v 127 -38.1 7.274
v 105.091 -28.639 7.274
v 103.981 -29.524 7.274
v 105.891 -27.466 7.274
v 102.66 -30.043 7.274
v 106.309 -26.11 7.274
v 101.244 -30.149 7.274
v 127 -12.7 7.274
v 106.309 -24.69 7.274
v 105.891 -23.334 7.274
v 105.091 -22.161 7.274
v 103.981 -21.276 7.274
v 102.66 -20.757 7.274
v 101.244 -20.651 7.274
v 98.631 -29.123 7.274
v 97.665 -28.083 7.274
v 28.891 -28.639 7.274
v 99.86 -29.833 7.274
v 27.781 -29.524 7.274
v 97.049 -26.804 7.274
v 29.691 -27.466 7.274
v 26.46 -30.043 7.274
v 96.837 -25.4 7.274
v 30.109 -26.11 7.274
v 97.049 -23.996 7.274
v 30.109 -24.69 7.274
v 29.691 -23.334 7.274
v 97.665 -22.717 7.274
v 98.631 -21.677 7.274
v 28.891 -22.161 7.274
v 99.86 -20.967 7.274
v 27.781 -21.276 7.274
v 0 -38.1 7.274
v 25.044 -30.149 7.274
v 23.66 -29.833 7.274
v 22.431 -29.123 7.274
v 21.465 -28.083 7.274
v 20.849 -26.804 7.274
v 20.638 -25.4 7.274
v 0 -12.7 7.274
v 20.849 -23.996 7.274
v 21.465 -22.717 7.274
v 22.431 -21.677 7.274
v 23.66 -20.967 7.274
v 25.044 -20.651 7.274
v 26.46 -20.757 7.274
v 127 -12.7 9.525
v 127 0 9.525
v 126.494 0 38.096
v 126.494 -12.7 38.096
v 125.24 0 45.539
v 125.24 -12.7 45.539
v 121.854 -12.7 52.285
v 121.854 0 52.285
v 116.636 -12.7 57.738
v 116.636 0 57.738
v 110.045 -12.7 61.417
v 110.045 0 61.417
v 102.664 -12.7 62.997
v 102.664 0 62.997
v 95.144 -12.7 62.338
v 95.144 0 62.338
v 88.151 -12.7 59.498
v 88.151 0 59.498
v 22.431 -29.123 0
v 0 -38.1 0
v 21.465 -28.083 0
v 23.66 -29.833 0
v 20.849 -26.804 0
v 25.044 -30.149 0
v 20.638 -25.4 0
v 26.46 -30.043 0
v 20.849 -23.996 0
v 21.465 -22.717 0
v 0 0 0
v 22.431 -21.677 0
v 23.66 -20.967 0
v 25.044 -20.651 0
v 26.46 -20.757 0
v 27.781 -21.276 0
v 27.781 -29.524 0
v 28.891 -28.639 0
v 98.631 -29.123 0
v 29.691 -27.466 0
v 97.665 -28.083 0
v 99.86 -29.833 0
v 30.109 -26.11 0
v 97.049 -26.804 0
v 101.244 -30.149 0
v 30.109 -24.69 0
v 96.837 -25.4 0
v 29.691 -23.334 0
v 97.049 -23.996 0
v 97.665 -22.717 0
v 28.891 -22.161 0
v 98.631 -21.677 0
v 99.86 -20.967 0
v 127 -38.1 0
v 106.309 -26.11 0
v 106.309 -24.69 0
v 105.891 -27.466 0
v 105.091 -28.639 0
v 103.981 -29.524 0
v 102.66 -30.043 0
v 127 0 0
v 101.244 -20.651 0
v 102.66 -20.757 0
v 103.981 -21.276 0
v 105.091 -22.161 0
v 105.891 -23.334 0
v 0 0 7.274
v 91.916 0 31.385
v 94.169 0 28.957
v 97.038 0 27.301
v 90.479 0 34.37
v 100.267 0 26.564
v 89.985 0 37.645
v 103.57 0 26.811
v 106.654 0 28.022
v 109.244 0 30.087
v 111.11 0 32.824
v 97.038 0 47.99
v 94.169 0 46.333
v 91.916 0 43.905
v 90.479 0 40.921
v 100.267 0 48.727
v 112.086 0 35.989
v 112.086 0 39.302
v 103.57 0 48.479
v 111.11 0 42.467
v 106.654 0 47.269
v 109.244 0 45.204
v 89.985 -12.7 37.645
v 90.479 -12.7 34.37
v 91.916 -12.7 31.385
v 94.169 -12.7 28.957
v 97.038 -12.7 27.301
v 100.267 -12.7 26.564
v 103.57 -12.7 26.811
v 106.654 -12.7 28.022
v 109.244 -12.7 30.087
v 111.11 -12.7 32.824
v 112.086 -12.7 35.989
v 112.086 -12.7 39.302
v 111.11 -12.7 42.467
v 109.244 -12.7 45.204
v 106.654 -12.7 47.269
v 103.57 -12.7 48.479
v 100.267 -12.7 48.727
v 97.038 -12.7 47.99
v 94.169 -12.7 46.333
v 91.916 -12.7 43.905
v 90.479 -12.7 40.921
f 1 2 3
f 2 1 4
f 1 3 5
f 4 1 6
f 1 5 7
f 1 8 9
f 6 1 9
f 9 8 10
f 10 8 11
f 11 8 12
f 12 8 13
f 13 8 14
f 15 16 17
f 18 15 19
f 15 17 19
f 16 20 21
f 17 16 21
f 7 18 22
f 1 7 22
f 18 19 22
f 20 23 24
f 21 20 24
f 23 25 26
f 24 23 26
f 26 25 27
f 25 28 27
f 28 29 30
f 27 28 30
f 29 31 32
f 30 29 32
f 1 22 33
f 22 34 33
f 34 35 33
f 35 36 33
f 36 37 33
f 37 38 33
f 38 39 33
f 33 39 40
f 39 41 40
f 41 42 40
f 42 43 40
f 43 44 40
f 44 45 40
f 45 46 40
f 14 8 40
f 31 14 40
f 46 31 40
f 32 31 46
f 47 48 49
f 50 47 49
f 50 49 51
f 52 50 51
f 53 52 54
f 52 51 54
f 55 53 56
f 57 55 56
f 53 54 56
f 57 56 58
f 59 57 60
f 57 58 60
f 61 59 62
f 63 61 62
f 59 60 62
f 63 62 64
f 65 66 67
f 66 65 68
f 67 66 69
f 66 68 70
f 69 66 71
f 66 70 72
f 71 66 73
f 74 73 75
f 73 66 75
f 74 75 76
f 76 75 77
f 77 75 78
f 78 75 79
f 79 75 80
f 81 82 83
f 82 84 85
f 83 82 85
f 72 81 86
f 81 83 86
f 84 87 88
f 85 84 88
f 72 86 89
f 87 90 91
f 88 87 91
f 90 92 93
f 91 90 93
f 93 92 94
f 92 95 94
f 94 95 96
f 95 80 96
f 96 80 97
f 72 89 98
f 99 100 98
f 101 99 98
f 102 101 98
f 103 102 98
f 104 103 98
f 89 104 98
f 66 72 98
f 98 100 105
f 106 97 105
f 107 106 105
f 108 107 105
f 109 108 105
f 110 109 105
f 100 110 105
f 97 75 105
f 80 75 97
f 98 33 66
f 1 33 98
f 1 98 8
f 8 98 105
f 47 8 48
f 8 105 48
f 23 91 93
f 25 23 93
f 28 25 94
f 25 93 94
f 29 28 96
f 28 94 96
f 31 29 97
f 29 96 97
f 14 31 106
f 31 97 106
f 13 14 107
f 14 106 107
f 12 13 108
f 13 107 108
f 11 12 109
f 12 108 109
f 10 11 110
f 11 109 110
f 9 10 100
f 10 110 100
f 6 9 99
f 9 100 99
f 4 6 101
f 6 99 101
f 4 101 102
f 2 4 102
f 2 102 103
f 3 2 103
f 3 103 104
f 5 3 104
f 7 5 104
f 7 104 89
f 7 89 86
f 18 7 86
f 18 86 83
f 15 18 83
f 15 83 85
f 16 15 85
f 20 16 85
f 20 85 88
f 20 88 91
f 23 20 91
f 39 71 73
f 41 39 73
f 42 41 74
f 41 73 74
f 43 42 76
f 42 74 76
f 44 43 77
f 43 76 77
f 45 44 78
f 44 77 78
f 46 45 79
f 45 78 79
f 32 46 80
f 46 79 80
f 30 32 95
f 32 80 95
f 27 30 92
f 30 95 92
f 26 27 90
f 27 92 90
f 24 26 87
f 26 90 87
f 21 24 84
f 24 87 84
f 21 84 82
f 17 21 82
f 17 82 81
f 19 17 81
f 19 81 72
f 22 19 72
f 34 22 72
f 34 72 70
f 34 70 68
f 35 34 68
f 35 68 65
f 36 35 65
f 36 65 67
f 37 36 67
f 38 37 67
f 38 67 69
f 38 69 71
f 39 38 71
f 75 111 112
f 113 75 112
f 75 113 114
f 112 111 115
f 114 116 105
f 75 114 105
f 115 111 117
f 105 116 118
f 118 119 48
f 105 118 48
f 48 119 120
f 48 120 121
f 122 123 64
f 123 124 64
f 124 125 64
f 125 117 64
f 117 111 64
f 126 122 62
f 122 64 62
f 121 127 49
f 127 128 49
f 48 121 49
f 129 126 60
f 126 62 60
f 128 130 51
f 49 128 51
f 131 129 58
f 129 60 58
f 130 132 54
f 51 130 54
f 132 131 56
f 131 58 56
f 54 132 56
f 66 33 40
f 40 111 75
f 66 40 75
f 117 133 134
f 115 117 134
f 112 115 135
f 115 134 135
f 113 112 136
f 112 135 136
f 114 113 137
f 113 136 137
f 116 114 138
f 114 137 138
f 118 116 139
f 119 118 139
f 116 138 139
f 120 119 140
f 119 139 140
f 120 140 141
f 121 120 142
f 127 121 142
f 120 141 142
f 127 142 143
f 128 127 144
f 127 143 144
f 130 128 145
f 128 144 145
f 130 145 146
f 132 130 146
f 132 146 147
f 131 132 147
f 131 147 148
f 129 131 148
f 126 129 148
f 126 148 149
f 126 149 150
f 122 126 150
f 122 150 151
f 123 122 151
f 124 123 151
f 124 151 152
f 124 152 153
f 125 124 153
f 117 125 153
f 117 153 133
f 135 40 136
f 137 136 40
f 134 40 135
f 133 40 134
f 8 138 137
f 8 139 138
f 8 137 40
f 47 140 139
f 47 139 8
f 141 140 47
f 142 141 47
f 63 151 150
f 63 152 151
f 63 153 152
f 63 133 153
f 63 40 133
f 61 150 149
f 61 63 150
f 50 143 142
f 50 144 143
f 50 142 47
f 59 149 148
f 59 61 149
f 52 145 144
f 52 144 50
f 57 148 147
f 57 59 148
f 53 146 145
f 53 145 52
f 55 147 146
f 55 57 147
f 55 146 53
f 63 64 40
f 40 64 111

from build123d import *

# Parameters (mm, degrees)
F1_DEPTH = 38.1
F2_DEPTH = 12.7
F3_D     = 22.225
F5_D     = 9.525


with BuildPart() as f1:
    # F0 (on Front) → F1 (new body)
    with BuildSketch(Plane.XZ):
        Polygon((0, 7.2736367583), (0, 0), (127, 0), (127, 7.2736367583), (101.6, 7.2736367583), align=None)
    extrude(amount=F1_DEPTH)

    # F0 (on Front) → F2 (join)
    with BuildSketch(Plane.XZ):
        with BuildLine():
            Line((88.1509339887, 59.4981372414), (0, 7.2736367583))
            Line((0, 7.2736367583), (101.6, 7.2736367583))
            Line((101.6, 7.2736367583), (127, 7.2736367583))
            Line((127, 7.2736367583), (127, 9.525))
            Line((127, 9.525), (126.4935228461, 38.0955111241))
            ThreePointArc((126.4935228461, 38.0955111241), (113.4775446111, 59.8240110713), (88.1509339887, 59.4981372414))
        make_face()
    extrude(amount=F2_DEPTH)

    # F3 (through all)
    with Locations(Plane(origin=(0, 0, 0), x_dir=(1, 0, 0), z_dir=(0, 1, 0))):
        with Locations((101.097512958, -37.6453092096)):
            Hole(F3_D / 2)

    # F5 (through all)
    with Locations(Plane.XY.offset(7.2736367583)):
        with Locations((25.4, -25.4), (101.6, -25.4)):
            Hole(F5_D / 2)


solid = f1.part
